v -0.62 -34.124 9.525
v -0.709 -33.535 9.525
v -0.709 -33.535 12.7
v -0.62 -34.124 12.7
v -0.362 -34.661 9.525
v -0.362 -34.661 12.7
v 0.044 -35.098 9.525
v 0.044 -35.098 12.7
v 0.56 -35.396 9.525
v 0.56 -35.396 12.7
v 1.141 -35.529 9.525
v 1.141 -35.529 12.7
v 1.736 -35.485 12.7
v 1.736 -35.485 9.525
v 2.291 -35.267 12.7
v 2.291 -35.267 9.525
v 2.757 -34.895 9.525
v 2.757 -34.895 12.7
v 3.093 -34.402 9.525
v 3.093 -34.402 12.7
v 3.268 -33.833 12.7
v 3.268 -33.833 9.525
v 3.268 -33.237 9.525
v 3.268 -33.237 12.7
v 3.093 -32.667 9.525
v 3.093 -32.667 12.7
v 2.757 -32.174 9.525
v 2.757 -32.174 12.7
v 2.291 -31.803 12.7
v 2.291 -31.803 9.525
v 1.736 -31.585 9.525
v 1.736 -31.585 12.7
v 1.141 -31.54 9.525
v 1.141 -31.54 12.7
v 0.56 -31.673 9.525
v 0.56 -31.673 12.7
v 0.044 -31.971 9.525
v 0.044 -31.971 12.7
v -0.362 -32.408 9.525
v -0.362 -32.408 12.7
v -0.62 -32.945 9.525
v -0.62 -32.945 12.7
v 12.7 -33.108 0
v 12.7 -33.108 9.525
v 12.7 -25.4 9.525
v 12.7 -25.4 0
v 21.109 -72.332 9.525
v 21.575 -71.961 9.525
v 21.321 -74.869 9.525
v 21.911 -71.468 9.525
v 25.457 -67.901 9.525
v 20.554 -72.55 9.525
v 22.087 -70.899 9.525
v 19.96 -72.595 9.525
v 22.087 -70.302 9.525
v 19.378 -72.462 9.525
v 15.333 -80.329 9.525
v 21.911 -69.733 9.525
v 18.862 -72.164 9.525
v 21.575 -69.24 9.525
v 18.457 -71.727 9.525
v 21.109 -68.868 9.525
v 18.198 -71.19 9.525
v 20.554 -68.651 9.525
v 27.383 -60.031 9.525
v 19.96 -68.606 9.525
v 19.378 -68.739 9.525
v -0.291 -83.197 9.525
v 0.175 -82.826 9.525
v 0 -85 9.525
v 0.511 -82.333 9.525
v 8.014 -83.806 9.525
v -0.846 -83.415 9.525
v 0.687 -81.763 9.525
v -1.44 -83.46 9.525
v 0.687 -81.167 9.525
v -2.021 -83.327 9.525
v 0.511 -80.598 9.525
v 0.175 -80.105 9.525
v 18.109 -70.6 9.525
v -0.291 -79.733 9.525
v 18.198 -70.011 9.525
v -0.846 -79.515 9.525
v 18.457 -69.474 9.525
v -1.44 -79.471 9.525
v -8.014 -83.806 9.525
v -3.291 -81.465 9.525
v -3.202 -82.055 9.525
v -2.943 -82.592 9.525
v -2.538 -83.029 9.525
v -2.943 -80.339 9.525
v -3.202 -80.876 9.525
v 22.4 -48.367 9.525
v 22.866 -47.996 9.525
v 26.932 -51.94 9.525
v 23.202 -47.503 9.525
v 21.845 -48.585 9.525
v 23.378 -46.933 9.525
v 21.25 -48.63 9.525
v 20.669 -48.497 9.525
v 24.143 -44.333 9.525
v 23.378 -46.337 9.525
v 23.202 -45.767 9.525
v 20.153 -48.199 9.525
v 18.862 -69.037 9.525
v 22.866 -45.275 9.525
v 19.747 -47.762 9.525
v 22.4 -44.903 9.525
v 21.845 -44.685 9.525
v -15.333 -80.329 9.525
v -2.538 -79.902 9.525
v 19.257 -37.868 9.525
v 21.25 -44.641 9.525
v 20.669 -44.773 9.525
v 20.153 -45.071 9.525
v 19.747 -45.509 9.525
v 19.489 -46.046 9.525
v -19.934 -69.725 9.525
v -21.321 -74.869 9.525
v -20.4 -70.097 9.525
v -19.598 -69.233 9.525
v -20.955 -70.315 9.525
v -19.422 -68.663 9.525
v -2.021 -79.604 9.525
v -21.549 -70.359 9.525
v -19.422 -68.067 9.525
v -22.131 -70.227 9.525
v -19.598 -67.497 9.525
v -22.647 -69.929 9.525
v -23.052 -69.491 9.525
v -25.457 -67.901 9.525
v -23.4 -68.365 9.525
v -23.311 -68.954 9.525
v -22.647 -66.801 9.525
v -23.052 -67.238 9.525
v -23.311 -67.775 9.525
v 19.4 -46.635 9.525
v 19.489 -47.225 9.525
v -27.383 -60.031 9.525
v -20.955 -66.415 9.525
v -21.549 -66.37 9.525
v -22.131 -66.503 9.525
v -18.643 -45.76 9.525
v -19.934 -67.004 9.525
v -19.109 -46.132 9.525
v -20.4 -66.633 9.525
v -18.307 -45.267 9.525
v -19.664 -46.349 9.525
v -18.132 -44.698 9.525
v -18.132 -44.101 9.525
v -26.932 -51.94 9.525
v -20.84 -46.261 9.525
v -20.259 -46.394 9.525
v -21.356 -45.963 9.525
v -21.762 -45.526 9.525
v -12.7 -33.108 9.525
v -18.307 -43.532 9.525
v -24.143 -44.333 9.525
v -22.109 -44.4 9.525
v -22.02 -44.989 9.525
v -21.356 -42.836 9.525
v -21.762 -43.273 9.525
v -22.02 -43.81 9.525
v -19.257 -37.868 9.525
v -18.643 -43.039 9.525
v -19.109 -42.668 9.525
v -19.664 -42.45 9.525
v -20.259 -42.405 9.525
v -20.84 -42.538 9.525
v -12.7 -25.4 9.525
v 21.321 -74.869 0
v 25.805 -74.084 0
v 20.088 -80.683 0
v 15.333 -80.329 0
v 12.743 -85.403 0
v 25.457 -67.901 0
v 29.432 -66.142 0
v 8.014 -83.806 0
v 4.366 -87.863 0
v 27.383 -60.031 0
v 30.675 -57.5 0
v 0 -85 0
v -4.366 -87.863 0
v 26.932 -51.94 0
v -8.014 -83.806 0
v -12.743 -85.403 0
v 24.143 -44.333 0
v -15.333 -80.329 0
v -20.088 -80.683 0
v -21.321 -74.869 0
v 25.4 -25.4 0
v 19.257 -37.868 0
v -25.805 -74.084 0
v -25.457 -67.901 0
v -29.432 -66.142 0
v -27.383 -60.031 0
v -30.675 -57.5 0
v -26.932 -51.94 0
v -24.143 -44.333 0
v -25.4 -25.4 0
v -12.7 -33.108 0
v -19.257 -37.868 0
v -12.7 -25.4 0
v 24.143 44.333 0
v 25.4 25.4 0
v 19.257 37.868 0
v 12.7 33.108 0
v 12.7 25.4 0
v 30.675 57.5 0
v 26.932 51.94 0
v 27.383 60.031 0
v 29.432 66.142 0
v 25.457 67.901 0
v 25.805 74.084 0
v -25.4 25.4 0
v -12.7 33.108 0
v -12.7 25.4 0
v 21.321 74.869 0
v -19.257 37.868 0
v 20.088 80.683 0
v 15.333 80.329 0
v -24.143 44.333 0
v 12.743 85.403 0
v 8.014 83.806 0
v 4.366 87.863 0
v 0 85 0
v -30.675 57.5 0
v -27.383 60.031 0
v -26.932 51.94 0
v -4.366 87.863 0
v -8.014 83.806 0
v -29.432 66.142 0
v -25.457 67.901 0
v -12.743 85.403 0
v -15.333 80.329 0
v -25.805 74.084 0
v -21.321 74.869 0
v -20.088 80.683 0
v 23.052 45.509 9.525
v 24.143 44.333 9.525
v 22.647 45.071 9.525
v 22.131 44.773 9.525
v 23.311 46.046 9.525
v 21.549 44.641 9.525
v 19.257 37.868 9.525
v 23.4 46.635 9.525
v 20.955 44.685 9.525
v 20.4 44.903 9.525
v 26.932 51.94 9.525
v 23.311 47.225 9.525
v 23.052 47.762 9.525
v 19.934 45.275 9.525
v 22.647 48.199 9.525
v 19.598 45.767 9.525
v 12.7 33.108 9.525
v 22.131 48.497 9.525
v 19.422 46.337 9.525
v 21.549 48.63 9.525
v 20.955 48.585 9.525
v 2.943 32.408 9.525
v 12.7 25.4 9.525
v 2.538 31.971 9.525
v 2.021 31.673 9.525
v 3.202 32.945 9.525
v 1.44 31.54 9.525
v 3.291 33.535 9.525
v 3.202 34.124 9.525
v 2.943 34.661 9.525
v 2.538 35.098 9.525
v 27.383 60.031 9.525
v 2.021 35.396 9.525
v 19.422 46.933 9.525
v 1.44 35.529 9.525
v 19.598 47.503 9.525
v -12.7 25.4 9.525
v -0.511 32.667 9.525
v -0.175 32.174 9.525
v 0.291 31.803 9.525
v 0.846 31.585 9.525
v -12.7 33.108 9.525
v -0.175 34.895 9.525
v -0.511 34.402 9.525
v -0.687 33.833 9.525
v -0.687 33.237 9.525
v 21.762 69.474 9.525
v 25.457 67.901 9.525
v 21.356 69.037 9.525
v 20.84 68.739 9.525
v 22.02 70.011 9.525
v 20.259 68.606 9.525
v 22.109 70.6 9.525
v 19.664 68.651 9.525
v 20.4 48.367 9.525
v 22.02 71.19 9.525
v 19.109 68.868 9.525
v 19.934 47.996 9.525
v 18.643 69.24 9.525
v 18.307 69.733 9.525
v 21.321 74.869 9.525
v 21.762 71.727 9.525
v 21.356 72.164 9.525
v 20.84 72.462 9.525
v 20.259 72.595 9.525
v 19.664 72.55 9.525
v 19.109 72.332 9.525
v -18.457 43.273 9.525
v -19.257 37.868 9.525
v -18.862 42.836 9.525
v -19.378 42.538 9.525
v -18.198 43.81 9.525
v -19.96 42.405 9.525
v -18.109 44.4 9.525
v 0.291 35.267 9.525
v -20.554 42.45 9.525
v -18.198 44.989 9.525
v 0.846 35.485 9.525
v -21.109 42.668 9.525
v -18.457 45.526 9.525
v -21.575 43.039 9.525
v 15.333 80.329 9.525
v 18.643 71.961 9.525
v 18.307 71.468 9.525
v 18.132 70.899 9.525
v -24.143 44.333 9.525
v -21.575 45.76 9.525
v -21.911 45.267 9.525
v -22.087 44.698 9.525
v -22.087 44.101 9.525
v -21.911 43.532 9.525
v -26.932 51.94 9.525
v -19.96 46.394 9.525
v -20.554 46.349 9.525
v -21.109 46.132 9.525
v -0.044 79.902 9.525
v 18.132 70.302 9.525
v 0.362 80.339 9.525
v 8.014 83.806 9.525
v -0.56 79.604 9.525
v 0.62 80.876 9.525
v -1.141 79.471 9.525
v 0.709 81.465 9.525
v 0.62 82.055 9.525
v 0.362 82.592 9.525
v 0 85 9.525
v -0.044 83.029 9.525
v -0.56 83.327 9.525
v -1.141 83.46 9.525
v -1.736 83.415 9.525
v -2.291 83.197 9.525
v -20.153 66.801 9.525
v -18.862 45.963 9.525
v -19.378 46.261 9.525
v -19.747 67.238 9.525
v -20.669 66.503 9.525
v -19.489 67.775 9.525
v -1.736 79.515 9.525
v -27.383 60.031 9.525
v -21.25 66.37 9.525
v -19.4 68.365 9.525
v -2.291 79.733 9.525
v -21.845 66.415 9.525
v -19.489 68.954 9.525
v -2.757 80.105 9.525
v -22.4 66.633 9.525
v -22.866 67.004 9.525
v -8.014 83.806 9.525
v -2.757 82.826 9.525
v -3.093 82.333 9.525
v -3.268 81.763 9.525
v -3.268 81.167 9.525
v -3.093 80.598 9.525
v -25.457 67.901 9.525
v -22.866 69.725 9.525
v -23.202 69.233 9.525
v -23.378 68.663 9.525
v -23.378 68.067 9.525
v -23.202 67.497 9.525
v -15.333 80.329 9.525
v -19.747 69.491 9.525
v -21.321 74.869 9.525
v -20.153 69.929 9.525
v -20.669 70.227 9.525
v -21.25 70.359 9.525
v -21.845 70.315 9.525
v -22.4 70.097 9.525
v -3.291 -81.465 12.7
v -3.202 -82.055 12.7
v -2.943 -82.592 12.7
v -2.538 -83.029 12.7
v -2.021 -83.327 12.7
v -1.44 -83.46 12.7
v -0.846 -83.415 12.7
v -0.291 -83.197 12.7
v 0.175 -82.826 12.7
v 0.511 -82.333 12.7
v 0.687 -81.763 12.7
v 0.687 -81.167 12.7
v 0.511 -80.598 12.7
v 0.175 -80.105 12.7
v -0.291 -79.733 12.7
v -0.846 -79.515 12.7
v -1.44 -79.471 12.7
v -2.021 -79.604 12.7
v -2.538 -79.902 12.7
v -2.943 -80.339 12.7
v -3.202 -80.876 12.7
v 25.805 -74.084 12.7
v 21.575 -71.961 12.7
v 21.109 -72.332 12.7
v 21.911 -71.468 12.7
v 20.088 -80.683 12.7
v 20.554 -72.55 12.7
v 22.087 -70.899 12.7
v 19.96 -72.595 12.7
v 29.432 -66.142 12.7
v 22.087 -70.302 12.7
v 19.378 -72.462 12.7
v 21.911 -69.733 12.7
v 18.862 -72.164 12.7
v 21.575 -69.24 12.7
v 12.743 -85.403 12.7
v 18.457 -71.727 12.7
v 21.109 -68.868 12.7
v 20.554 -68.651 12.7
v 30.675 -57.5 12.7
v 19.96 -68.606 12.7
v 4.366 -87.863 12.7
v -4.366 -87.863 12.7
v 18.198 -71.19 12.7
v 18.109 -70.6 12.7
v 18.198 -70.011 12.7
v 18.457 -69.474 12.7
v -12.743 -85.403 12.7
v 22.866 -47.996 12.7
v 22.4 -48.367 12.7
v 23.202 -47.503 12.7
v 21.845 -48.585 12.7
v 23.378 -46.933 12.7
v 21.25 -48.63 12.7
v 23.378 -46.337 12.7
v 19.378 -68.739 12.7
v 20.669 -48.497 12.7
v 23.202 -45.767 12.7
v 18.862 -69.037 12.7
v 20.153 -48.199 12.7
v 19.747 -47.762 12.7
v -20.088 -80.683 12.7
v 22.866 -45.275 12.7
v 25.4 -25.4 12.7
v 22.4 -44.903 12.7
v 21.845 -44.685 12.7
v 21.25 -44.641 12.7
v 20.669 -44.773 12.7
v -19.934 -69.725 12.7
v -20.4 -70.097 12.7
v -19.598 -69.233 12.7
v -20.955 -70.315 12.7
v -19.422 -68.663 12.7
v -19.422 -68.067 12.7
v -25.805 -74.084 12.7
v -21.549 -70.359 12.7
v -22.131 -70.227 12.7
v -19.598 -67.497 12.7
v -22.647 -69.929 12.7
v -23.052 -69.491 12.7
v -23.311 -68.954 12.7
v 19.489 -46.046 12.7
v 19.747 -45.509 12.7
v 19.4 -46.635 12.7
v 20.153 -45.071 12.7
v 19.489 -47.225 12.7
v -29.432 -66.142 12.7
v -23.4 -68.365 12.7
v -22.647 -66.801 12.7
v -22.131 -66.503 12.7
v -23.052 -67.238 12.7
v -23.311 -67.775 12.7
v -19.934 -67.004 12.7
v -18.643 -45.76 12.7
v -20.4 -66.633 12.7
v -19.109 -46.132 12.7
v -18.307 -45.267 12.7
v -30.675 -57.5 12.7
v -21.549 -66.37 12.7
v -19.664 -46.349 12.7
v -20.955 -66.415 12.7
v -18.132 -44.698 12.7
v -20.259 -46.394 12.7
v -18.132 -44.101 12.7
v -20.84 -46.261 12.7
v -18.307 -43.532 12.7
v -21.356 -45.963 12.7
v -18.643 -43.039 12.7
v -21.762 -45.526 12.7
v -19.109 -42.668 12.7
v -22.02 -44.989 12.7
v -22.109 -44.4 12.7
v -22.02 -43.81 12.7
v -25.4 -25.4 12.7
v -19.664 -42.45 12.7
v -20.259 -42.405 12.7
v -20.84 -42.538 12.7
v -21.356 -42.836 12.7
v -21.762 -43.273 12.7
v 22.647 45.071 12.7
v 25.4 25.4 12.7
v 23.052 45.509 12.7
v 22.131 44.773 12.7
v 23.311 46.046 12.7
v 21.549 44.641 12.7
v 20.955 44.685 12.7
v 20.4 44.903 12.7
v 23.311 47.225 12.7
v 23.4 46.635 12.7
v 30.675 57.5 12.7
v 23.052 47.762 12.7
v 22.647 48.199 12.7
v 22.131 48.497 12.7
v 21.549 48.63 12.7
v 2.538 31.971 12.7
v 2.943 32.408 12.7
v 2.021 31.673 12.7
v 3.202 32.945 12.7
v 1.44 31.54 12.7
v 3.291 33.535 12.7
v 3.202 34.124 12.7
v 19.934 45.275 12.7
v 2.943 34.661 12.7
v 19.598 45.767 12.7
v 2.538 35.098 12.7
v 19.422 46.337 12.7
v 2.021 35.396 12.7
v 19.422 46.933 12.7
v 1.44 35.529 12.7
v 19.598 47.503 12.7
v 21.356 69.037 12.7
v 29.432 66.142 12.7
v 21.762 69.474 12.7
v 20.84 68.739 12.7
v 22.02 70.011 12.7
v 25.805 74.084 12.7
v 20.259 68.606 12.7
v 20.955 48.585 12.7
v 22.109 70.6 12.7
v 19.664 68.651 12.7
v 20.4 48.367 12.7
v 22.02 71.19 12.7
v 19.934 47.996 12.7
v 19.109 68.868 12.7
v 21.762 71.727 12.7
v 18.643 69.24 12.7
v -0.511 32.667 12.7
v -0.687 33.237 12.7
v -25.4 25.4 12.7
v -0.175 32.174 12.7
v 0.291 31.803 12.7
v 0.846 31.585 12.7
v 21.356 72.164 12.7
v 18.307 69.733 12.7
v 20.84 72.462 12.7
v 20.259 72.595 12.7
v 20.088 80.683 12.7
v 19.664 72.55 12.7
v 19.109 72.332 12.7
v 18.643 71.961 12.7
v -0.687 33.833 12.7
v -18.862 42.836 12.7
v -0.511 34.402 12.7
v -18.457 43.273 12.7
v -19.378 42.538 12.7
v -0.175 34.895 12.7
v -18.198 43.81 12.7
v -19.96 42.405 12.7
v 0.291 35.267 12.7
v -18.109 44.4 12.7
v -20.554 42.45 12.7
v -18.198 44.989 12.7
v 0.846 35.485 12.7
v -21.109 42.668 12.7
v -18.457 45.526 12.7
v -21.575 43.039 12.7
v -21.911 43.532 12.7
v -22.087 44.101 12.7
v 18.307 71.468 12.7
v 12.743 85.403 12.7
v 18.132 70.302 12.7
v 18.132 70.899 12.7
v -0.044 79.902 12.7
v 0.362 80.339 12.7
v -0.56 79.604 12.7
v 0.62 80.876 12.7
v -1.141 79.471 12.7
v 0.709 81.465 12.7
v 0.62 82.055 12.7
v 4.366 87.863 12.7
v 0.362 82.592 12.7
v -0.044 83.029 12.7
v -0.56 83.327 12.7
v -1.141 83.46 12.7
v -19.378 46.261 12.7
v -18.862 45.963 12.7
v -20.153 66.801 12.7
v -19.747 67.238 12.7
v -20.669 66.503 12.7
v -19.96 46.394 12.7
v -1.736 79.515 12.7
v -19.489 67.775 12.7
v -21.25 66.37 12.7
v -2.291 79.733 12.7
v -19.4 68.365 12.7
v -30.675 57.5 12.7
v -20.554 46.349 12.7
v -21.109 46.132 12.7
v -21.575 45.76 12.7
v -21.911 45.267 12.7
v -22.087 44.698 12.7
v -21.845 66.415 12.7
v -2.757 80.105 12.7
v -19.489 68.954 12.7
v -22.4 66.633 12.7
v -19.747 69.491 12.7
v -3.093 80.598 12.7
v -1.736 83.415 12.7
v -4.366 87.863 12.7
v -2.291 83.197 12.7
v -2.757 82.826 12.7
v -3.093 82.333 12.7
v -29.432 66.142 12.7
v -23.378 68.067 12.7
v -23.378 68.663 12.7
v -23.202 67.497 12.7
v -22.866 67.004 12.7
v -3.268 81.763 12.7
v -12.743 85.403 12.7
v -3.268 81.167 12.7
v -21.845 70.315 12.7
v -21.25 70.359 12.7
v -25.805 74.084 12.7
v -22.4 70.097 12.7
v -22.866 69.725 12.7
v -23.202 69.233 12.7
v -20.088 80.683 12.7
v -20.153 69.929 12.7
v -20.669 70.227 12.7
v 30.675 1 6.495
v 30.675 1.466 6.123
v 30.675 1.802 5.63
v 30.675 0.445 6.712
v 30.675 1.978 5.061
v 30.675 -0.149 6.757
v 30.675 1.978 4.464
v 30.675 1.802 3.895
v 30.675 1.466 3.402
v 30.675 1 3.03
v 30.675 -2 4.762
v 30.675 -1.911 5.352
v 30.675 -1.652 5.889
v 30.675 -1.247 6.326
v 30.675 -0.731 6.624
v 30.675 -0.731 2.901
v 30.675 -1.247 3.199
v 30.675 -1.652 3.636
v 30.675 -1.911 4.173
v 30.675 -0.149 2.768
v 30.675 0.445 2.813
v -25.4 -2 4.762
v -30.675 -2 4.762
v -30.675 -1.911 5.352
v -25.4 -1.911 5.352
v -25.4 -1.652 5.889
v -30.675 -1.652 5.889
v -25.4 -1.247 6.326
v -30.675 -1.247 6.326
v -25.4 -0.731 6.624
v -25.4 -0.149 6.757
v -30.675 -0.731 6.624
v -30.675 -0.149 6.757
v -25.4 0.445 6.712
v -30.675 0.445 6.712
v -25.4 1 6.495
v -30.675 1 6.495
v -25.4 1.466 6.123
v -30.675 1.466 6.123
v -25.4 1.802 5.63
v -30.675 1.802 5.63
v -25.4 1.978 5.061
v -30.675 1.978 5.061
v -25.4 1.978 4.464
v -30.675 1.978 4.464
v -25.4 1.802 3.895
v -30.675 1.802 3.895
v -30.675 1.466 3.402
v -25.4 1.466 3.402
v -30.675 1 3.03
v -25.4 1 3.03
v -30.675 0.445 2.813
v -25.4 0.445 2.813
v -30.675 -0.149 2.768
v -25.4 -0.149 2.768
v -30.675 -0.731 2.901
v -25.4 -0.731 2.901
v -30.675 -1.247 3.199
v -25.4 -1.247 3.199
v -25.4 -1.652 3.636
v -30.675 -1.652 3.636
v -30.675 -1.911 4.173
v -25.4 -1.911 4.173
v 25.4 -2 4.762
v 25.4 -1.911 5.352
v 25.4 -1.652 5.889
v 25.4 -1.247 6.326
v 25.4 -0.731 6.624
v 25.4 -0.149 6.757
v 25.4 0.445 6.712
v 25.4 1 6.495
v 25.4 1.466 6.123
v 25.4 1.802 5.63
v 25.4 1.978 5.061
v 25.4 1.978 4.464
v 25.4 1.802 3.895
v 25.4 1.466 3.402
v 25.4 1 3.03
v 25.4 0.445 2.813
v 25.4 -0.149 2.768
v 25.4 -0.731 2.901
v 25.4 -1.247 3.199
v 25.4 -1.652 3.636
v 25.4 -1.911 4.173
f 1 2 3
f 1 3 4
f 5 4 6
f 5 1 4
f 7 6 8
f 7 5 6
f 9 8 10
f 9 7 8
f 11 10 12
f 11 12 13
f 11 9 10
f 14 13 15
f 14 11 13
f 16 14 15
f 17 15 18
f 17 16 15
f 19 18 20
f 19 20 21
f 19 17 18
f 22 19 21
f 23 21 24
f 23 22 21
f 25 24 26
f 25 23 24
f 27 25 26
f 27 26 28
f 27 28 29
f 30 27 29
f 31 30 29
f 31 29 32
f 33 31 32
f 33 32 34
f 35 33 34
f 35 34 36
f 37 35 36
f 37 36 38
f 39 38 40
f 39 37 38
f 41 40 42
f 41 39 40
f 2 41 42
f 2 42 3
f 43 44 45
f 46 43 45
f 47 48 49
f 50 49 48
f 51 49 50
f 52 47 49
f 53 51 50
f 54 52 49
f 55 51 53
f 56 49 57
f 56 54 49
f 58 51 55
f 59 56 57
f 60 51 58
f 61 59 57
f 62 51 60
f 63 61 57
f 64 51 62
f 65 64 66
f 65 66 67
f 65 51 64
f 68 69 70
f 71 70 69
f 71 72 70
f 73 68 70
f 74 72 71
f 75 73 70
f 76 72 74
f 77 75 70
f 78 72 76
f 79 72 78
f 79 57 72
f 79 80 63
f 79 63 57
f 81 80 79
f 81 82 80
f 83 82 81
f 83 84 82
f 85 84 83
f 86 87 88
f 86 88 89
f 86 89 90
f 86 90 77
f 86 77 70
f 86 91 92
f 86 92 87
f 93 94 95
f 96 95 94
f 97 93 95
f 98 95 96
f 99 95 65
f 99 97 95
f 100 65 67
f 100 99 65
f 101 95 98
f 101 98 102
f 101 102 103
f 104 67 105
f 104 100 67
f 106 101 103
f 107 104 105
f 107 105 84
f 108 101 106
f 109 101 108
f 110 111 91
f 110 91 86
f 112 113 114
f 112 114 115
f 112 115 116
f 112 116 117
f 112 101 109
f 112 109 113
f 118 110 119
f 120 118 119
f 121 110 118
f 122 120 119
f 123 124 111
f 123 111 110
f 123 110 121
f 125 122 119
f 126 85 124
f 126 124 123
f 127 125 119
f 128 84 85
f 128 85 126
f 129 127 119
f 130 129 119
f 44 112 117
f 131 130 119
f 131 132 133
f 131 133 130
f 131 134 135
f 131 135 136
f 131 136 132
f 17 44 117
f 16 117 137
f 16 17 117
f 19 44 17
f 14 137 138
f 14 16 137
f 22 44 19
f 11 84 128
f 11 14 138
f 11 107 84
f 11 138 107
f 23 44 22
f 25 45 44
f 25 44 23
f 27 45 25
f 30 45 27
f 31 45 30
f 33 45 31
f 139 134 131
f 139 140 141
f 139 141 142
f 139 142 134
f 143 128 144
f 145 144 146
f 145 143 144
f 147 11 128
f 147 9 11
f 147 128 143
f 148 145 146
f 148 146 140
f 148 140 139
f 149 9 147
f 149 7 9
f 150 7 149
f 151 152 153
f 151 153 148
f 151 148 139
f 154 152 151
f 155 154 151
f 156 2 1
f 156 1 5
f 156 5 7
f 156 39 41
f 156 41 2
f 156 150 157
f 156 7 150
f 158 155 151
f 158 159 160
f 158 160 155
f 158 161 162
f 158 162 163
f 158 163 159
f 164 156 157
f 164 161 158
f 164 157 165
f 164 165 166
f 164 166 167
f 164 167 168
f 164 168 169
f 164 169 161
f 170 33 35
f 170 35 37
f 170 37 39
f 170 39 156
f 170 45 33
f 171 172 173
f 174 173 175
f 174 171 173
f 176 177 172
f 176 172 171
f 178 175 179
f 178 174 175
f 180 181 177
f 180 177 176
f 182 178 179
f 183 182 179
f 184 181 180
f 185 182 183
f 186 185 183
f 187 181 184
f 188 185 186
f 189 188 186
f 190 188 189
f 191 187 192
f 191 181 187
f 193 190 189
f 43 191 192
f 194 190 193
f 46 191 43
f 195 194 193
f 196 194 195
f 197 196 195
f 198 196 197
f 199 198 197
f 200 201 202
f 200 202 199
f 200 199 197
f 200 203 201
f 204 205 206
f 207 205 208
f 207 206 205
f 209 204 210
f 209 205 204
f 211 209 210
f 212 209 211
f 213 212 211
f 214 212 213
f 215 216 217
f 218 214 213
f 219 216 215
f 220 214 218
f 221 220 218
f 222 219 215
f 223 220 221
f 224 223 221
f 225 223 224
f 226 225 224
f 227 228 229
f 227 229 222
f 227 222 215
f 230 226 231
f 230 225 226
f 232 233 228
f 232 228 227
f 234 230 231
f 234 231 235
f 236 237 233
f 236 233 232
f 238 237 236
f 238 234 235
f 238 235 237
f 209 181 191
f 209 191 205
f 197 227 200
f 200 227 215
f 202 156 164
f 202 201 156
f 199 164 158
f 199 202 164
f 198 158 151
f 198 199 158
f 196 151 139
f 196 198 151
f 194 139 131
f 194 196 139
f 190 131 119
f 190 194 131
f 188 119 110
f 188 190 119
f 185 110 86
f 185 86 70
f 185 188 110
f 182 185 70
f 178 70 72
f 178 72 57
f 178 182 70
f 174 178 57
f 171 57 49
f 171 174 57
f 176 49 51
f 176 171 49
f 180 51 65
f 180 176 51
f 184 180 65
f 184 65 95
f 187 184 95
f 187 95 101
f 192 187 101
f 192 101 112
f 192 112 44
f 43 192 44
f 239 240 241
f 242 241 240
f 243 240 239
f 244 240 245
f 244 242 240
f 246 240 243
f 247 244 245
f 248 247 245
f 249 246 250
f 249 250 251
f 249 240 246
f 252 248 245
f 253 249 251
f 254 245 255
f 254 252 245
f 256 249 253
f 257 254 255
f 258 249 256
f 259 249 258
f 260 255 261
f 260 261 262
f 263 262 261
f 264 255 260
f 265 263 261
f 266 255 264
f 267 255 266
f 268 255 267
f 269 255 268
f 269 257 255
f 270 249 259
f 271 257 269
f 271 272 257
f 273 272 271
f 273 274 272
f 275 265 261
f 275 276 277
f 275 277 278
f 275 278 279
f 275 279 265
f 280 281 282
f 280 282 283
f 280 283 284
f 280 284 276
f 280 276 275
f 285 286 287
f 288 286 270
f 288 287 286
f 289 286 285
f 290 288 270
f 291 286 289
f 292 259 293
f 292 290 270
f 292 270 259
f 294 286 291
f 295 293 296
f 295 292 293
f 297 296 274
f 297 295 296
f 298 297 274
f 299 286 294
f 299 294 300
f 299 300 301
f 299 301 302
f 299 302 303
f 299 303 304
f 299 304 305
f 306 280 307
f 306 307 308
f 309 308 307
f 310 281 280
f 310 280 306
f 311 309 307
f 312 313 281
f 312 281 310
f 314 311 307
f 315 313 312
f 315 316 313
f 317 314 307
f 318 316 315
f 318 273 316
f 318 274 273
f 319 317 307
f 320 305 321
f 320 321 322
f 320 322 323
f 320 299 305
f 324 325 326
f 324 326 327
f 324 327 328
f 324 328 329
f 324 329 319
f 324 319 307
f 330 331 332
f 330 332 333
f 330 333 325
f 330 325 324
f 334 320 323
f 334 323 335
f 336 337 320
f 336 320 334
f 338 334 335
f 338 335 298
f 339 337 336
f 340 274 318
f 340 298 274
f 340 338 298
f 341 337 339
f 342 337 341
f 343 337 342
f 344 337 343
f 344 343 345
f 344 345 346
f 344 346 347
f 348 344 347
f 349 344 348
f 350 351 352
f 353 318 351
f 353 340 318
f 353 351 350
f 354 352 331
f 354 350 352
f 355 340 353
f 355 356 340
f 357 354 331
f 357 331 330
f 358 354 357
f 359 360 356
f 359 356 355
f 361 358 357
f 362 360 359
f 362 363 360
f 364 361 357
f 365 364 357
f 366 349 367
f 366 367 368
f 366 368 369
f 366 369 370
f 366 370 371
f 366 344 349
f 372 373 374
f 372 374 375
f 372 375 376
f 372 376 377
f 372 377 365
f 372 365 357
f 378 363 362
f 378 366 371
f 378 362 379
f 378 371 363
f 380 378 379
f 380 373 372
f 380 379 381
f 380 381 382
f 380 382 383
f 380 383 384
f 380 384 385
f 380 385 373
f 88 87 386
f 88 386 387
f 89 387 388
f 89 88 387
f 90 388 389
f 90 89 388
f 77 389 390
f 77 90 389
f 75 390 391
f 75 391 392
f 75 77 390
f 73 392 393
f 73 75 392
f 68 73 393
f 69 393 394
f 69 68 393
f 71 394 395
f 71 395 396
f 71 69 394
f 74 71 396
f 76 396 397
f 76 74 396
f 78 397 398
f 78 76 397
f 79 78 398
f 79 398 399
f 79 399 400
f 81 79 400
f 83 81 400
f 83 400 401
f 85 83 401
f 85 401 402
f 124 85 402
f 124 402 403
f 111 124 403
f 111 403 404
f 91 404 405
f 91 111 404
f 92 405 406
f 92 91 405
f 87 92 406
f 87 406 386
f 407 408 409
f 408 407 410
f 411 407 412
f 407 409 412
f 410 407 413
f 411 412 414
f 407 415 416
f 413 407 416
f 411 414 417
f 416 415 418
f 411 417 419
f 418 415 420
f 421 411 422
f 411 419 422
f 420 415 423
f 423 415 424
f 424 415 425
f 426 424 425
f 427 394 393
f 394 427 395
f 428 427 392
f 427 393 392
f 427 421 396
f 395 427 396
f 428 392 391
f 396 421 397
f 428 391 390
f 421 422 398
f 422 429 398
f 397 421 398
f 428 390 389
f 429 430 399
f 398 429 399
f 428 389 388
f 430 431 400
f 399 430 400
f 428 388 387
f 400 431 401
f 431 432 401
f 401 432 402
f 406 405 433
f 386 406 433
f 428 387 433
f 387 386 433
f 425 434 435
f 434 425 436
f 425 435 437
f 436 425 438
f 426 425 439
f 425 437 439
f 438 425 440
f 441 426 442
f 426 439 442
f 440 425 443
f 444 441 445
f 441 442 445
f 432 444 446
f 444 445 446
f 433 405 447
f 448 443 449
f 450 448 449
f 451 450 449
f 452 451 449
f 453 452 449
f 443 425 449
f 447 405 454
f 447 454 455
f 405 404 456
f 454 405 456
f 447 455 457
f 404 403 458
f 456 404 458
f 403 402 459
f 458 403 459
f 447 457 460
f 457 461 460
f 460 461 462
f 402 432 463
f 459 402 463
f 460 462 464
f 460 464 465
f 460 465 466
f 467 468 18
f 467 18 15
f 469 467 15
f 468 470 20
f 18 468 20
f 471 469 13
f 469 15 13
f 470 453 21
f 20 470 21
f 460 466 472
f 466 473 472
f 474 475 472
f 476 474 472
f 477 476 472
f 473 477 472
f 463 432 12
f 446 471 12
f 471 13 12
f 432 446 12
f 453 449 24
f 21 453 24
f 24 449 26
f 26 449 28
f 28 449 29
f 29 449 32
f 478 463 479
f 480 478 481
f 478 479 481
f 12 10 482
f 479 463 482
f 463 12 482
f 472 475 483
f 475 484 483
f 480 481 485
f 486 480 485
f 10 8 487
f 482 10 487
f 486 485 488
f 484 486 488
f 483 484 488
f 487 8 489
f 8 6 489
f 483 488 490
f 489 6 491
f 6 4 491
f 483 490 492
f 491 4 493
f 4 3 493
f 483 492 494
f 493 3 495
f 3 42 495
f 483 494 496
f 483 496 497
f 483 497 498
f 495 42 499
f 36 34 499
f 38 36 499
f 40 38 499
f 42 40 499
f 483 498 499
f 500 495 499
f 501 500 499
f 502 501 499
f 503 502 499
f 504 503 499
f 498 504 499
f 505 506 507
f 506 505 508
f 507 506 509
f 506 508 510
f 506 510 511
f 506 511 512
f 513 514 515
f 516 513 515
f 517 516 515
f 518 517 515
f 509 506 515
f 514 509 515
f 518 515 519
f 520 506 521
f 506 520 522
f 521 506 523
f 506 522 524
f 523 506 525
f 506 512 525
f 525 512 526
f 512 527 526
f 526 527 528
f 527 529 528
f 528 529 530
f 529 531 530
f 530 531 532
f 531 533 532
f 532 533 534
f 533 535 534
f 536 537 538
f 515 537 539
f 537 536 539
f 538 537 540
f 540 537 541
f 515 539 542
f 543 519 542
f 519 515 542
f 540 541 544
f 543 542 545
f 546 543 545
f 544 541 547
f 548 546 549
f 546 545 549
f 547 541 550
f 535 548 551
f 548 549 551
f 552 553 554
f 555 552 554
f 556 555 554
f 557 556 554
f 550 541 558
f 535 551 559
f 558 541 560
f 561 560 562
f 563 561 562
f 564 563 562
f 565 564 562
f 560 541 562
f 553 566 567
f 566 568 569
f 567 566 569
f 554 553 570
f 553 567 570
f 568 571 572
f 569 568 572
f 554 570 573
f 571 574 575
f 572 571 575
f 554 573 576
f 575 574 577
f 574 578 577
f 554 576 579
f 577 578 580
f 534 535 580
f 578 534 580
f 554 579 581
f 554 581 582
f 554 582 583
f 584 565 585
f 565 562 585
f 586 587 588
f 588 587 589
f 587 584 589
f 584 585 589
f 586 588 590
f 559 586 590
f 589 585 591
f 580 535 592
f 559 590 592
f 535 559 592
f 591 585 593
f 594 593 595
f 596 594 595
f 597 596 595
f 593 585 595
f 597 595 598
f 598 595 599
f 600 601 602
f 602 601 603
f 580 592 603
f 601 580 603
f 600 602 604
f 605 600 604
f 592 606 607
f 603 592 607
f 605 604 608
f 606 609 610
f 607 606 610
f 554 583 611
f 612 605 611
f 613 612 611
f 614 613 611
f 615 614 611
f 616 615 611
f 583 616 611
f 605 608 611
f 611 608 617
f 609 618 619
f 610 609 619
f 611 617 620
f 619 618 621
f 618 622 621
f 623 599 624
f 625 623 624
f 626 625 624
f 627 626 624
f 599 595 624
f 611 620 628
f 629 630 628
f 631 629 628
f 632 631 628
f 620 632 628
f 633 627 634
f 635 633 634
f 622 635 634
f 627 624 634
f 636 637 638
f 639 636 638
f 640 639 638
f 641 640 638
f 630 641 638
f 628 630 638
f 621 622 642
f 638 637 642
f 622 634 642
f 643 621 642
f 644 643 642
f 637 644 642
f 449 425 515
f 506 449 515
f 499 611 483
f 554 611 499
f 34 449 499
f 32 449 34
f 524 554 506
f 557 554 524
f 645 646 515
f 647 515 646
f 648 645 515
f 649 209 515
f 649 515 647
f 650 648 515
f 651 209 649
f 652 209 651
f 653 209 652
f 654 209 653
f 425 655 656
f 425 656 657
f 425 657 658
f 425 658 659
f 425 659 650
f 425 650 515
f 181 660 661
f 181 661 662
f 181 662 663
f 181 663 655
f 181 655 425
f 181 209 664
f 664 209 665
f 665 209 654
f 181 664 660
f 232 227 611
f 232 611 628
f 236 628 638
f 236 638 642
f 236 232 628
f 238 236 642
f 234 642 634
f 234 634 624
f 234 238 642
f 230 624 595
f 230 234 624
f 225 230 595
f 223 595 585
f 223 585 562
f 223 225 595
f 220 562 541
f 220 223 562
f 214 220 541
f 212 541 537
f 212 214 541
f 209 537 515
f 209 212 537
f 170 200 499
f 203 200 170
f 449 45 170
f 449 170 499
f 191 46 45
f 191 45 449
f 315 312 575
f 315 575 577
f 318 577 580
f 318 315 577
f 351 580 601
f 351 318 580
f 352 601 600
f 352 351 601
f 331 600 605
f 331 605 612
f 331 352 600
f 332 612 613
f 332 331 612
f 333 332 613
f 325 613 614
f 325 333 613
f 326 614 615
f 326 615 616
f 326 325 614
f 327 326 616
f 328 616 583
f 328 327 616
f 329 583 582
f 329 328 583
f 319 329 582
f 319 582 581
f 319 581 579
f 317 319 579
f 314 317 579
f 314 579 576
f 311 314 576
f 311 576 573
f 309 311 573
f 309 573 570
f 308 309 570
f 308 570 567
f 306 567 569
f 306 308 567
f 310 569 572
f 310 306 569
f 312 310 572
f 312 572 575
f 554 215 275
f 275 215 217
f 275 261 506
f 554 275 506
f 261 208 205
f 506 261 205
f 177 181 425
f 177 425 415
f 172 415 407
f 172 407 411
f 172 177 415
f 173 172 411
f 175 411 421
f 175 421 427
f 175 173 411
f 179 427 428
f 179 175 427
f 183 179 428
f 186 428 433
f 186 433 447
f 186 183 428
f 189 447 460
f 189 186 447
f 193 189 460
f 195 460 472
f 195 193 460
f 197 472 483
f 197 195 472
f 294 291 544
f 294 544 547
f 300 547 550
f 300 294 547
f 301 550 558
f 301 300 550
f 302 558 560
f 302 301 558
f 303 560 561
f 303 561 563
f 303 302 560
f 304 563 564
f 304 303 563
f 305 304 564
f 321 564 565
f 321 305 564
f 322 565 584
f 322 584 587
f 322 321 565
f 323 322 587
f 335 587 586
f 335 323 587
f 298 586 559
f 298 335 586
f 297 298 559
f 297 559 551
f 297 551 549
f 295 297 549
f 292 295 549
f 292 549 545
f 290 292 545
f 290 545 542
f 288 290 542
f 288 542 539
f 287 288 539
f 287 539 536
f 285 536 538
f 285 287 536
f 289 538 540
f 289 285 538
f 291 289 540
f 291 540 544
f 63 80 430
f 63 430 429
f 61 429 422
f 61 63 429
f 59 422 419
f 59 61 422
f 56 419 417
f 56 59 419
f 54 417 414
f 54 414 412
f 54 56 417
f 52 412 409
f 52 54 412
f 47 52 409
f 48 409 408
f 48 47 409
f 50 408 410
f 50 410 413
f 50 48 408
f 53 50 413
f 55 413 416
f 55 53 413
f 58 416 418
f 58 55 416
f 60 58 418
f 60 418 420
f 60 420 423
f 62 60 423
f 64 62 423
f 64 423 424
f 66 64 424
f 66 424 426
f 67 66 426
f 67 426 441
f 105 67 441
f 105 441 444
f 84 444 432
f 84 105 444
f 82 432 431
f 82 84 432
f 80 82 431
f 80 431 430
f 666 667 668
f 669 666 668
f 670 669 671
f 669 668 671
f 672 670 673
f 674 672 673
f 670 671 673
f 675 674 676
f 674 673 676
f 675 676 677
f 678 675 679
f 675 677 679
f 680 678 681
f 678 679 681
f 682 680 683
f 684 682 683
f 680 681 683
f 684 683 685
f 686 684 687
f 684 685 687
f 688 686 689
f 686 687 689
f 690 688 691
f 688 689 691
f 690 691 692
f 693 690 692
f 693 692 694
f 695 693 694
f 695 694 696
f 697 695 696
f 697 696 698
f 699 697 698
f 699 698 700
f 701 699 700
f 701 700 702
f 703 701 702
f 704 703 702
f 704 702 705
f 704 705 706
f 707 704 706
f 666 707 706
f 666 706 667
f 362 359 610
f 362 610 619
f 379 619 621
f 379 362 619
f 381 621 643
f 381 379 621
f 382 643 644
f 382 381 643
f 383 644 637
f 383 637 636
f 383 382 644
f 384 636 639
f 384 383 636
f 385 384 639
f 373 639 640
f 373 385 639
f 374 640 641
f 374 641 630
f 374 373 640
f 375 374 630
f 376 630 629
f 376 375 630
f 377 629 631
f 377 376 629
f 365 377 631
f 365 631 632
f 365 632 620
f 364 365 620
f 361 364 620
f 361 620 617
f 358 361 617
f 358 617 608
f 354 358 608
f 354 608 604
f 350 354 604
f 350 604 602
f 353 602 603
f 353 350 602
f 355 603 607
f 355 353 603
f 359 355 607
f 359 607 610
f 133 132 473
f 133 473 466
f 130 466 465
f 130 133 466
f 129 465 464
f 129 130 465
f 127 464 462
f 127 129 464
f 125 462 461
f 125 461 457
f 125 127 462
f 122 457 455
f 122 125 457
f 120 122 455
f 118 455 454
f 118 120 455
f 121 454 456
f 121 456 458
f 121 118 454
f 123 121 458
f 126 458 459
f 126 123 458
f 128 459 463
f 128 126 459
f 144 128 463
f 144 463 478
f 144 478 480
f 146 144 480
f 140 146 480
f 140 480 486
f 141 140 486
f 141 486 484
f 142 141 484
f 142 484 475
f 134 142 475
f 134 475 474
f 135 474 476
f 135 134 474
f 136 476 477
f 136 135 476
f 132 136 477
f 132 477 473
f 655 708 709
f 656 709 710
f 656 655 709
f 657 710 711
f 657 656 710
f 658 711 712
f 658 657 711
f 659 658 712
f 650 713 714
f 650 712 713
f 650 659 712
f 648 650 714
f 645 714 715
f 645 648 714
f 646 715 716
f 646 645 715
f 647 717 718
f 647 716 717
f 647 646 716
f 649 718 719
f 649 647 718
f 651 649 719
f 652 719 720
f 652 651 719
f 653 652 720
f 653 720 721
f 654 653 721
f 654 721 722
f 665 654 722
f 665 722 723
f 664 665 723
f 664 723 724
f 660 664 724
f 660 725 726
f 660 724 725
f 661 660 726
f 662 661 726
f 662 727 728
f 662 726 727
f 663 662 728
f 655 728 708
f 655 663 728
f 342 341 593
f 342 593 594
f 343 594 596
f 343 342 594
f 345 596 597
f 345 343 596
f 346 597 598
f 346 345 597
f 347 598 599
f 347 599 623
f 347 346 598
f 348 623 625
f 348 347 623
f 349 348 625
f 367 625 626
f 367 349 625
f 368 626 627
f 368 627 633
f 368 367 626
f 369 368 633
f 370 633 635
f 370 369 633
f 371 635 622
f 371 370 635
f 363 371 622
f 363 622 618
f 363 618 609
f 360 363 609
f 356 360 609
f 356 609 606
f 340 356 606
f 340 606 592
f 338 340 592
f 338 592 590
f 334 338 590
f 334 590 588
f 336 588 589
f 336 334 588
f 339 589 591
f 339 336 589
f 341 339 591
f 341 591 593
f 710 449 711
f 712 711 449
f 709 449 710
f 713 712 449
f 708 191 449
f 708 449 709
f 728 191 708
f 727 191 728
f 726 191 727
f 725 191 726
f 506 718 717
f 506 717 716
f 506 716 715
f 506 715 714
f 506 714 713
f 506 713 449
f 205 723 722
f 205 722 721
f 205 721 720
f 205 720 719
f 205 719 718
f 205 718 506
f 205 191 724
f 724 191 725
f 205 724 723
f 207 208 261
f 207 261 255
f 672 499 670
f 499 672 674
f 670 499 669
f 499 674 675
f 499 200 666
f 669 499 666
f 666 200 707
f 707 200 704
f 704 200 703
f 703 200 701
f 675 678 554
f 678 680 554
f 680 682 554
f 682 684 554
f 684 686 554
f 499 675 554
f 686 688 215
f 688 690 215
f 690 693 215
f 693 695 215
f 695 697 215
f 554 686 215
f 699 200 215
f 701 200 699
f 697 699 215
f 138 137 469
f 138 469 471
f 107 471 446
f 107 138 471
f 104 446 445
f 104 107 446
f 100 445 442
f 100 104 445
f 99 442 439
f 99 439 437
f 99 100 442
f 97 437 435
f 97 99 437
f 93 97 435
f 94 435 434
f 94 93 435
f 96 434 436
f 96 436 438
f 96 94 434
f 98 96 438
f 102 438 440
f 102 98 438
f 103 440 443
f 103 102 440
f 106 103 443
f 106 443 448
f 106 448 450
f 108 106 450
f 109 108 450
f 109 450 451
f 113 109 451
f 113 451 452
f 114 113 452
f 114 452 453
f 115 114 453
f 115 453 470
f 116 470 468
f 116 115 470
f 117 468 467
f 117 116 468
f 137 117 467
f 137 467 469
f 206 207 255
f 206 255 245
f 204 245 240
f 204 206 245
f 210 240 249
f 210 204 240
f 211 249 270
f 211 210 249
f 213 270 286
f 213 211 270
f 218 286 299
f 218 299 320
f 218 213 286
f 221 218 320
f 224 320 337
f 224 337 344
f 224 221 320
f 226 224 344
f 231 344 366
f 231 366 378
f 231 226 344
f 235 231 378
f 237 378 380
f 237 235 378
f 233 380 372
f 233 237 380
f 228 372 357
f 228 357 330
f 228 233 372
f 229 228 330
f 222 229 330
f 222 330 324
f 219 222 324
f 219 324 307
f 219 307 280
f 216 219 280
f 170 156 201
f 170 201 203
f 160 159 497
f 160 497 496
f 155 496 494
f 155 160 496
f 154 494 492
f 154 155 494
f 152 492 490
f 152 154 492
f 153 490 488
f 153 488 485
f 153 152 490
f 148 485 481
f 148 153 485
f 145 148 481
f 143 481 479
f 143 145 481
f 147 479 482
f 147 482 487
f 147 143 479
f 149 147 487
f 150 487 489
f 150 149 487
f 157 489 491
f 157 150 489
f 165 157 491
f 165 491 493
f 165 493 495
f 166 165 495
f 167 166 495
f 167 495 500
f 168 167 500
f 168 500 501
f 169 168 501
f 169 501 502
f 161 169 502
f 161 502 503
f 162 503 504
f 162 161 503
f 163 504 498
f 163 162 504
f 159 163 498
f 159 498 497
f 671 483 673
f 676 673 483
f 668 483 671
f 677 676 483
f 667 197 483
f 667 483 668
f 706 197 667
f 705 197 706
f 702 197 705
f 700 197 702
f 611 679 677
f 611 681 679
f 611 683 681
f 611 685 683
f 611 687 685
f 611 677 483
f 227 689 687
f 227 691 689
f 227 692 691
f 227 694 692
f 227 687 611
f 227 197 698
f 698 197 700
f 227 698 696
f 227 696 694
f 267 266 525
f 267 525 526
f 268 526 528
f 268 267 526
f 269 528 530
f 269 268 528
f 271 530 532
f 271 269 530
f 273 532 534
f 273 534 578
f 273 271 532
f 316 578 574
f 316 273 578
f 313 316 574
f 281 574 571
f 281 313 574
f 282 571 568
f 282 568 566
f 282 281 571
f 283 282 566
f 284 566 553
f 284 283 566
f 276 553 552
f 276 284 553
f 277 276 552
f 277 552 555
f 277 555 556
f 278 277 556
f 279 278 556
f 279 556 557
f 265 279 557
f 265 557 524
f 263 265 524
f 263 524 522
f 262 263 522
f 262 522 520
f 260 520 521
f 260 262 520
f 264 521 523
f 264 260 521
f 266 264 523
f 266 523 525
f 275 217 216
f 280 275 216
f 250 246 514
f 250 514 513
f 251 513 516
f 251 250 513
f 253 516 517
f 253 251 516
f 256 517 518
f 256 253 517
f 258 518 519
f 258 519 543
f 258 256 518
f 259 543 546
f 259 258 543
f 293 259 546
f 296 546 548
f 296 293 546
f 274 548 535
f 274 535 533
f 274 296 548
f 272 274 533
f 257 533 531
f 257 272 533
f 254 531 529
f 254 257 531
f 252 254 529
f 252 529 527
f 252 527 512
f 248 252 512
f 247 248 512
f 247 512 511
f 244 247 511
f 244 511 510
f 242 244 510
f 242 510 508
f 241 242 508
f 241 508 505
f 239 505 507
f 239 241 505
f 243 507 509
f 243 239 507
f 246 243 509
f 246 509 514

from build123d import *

# Parameters (mm, degrees)
SKETCH1_R           = 27.5
SKETCH1_W           = 50.8
SKETCH1_H           = 50.8
BOSS_EXTRUDE1_DEPTH = 12.7
BOSS_EXTRUDE2_START = -3.175
SKETCH2_R           = 2
SKETCH2_W           = 50.8
SKETCH2_H           = 50.8
BOSS_EXTRUDE2_DEPTH = 3.175
SKETCH7_R           = 2
CUT_EXTRUDE4_DEPTH  = 10
SKETCH8_W           = 25.4
SKETCH8_H           = 75
CUT_EXTRUDE5_DEPTH  = 9.525


with BuildPart() as part:
    # Sketch1 → Boss-Extrude1 (new body)
    with BuildSketch(Plane.XY):
        with BuildLine():
            Line((30.675000233, 57.5), (30.675000233, -57.5))
            ThreePointArc((30.675000233, -57.5), (0, -88.175000233), (-30.675000233, -57.5))
            Line((-30.675000233, -57.5), (-30.675000233, 57.5))
            ThreePointArc((-30.675000233, 57.5), (0, 88.175000233), (30.675000233, 57.5))
        make_face()
        with Locations((0, -57.5)):
            Circle(SKETCH1_R, mode=Mode.SUBTRACT)
        with Locations(Location((0, 57.5, 0), (0, 0, 180))):
            Circle(SKETCH1_R, mode=Mode.SUBTRACT)
        Rectangle(SKETCH1_W, SKETCH1_H, mode=Mode.SUBTRACT)
    extrude(amount=BOSS_EXTRUDE1_DEPTH)

    # Sketch2 → Boss-Extrude2 (add)
    with BuildSketch(Plane.XY.offset(12.7).offset(BOSS_EXTRUDE2_START)):
        with BuildLine():
            Line((30.675000233, -57.5), (30.675000233, 57.5))
            ThreePointArc((30.675000233, 57.5), (0, 88.175000233), (-30.675000233, 57.5))
            Line((-30.675000233, 57.5), (-30.675000233, -57.5))
            ThreePointArc((-30.675000233, -57.5), (0, -88.175000233), (30.675000233, -57.5))
        make_face()
        with Locations((-1.290716795, 81.465267579)):
            Circle(SKETCH2_R, mode=Mode.SUBTRACT)
        with Locations((20.109172135, 70.600427323)):
            Circle(SKETCH2_R, mode=Mode.SUBTRACT)
        with Locations((21.39988893, 46.635159744)):
            Circle(SKETCH2_R, mode=Mode.SUBTRACT)
        with Locations((1.290716795, 33.534732421)):
            Circle(SKETCH2_R, mode=Mode.SUBTRACT)
        with Locations((-20.109172135, 44.399572677)):
            Circle(SKETCH2_R, mode=Mode.SUBTRACT)
        with Locations((-21.39988893, 68.364840256)):
            Circle(SKETCH2_R, mode=Mode.SUBTRACT)
        with Locations(Location((-21.39988893, -68.364840256, 0), (0, 0, 180))):
            Circle(SKETCH2_R, mode=Mode.SUBTRACT)
        with Locations(Location((-20.109172135, -44.399572677, 0), (0, 0, 180))):
            Circle(SKETCH2_R, mode=Mode.SUBTRACT)
        with Locations(Location((1.290716795, -33.534732421, 0), (0, 0, 180))):
            Circle(SKETCH2_R, mode=Mode.SUBTRACT)
        with Locations(Location((21.39988893, -46.635159744, 0), (0, 0, 180))):
            Circle(SKETCH2_R, mode=Mode.SUBTRACT)
        with Locations(Location((20.109172135, -70.600427323, 0), (0, 0, 180))):
            Circle(SKETCH2_R, mode=Mode.SUBTRACT)
        with Locations(Location((-1.290716795, -81.465267579, 0), (0, 0, 180))):
            Circle(SKETCH2_R, mode=Mode.SUBTRACT)
        Rectangle(SKETCH2_W, SKETCH2_H, mode=Mode.SUBTRACT)
    extrude(amount=BOSS_EXTRUDE2_DEPTH)

    # Sketch7 → Cut-Extrude4 (cut)
    with BuildSketch(Plane.ZY.offset(30.675000233)):
        with Locations(Location((4.7625, 0, 0), (0, 0, 270))):
            Circle(SKETCH7_R)
    cut_extrude4 = extrude(amount=-CUT_EXTRUDE4_DEPTH, mode=Mode.SUBTRACT)

    # Mirror2: Cut-Extrude4 across plane
    add(cut_extrude4.mirror(Plane(origin=(0, 0, 0), x_dir=(0, 0, 1), z_dir=(1, 0, 0))), mode=Mode.SUBTRACT)

    # Sketch8 → Cut-Extrude5 (cut)
    with BuildSketch(Plane(origin=(0, 0, 0), x_dir=(-1, 0, 0), z_dir=(0, 0, -1))):
        Rectangle(SKETCH8_W, SKETCH8_H)
    extrude(amount=-CUT_EXTRUDE5_DEPTH, mode=Mode.SUBTRACT)


solid = part.part
